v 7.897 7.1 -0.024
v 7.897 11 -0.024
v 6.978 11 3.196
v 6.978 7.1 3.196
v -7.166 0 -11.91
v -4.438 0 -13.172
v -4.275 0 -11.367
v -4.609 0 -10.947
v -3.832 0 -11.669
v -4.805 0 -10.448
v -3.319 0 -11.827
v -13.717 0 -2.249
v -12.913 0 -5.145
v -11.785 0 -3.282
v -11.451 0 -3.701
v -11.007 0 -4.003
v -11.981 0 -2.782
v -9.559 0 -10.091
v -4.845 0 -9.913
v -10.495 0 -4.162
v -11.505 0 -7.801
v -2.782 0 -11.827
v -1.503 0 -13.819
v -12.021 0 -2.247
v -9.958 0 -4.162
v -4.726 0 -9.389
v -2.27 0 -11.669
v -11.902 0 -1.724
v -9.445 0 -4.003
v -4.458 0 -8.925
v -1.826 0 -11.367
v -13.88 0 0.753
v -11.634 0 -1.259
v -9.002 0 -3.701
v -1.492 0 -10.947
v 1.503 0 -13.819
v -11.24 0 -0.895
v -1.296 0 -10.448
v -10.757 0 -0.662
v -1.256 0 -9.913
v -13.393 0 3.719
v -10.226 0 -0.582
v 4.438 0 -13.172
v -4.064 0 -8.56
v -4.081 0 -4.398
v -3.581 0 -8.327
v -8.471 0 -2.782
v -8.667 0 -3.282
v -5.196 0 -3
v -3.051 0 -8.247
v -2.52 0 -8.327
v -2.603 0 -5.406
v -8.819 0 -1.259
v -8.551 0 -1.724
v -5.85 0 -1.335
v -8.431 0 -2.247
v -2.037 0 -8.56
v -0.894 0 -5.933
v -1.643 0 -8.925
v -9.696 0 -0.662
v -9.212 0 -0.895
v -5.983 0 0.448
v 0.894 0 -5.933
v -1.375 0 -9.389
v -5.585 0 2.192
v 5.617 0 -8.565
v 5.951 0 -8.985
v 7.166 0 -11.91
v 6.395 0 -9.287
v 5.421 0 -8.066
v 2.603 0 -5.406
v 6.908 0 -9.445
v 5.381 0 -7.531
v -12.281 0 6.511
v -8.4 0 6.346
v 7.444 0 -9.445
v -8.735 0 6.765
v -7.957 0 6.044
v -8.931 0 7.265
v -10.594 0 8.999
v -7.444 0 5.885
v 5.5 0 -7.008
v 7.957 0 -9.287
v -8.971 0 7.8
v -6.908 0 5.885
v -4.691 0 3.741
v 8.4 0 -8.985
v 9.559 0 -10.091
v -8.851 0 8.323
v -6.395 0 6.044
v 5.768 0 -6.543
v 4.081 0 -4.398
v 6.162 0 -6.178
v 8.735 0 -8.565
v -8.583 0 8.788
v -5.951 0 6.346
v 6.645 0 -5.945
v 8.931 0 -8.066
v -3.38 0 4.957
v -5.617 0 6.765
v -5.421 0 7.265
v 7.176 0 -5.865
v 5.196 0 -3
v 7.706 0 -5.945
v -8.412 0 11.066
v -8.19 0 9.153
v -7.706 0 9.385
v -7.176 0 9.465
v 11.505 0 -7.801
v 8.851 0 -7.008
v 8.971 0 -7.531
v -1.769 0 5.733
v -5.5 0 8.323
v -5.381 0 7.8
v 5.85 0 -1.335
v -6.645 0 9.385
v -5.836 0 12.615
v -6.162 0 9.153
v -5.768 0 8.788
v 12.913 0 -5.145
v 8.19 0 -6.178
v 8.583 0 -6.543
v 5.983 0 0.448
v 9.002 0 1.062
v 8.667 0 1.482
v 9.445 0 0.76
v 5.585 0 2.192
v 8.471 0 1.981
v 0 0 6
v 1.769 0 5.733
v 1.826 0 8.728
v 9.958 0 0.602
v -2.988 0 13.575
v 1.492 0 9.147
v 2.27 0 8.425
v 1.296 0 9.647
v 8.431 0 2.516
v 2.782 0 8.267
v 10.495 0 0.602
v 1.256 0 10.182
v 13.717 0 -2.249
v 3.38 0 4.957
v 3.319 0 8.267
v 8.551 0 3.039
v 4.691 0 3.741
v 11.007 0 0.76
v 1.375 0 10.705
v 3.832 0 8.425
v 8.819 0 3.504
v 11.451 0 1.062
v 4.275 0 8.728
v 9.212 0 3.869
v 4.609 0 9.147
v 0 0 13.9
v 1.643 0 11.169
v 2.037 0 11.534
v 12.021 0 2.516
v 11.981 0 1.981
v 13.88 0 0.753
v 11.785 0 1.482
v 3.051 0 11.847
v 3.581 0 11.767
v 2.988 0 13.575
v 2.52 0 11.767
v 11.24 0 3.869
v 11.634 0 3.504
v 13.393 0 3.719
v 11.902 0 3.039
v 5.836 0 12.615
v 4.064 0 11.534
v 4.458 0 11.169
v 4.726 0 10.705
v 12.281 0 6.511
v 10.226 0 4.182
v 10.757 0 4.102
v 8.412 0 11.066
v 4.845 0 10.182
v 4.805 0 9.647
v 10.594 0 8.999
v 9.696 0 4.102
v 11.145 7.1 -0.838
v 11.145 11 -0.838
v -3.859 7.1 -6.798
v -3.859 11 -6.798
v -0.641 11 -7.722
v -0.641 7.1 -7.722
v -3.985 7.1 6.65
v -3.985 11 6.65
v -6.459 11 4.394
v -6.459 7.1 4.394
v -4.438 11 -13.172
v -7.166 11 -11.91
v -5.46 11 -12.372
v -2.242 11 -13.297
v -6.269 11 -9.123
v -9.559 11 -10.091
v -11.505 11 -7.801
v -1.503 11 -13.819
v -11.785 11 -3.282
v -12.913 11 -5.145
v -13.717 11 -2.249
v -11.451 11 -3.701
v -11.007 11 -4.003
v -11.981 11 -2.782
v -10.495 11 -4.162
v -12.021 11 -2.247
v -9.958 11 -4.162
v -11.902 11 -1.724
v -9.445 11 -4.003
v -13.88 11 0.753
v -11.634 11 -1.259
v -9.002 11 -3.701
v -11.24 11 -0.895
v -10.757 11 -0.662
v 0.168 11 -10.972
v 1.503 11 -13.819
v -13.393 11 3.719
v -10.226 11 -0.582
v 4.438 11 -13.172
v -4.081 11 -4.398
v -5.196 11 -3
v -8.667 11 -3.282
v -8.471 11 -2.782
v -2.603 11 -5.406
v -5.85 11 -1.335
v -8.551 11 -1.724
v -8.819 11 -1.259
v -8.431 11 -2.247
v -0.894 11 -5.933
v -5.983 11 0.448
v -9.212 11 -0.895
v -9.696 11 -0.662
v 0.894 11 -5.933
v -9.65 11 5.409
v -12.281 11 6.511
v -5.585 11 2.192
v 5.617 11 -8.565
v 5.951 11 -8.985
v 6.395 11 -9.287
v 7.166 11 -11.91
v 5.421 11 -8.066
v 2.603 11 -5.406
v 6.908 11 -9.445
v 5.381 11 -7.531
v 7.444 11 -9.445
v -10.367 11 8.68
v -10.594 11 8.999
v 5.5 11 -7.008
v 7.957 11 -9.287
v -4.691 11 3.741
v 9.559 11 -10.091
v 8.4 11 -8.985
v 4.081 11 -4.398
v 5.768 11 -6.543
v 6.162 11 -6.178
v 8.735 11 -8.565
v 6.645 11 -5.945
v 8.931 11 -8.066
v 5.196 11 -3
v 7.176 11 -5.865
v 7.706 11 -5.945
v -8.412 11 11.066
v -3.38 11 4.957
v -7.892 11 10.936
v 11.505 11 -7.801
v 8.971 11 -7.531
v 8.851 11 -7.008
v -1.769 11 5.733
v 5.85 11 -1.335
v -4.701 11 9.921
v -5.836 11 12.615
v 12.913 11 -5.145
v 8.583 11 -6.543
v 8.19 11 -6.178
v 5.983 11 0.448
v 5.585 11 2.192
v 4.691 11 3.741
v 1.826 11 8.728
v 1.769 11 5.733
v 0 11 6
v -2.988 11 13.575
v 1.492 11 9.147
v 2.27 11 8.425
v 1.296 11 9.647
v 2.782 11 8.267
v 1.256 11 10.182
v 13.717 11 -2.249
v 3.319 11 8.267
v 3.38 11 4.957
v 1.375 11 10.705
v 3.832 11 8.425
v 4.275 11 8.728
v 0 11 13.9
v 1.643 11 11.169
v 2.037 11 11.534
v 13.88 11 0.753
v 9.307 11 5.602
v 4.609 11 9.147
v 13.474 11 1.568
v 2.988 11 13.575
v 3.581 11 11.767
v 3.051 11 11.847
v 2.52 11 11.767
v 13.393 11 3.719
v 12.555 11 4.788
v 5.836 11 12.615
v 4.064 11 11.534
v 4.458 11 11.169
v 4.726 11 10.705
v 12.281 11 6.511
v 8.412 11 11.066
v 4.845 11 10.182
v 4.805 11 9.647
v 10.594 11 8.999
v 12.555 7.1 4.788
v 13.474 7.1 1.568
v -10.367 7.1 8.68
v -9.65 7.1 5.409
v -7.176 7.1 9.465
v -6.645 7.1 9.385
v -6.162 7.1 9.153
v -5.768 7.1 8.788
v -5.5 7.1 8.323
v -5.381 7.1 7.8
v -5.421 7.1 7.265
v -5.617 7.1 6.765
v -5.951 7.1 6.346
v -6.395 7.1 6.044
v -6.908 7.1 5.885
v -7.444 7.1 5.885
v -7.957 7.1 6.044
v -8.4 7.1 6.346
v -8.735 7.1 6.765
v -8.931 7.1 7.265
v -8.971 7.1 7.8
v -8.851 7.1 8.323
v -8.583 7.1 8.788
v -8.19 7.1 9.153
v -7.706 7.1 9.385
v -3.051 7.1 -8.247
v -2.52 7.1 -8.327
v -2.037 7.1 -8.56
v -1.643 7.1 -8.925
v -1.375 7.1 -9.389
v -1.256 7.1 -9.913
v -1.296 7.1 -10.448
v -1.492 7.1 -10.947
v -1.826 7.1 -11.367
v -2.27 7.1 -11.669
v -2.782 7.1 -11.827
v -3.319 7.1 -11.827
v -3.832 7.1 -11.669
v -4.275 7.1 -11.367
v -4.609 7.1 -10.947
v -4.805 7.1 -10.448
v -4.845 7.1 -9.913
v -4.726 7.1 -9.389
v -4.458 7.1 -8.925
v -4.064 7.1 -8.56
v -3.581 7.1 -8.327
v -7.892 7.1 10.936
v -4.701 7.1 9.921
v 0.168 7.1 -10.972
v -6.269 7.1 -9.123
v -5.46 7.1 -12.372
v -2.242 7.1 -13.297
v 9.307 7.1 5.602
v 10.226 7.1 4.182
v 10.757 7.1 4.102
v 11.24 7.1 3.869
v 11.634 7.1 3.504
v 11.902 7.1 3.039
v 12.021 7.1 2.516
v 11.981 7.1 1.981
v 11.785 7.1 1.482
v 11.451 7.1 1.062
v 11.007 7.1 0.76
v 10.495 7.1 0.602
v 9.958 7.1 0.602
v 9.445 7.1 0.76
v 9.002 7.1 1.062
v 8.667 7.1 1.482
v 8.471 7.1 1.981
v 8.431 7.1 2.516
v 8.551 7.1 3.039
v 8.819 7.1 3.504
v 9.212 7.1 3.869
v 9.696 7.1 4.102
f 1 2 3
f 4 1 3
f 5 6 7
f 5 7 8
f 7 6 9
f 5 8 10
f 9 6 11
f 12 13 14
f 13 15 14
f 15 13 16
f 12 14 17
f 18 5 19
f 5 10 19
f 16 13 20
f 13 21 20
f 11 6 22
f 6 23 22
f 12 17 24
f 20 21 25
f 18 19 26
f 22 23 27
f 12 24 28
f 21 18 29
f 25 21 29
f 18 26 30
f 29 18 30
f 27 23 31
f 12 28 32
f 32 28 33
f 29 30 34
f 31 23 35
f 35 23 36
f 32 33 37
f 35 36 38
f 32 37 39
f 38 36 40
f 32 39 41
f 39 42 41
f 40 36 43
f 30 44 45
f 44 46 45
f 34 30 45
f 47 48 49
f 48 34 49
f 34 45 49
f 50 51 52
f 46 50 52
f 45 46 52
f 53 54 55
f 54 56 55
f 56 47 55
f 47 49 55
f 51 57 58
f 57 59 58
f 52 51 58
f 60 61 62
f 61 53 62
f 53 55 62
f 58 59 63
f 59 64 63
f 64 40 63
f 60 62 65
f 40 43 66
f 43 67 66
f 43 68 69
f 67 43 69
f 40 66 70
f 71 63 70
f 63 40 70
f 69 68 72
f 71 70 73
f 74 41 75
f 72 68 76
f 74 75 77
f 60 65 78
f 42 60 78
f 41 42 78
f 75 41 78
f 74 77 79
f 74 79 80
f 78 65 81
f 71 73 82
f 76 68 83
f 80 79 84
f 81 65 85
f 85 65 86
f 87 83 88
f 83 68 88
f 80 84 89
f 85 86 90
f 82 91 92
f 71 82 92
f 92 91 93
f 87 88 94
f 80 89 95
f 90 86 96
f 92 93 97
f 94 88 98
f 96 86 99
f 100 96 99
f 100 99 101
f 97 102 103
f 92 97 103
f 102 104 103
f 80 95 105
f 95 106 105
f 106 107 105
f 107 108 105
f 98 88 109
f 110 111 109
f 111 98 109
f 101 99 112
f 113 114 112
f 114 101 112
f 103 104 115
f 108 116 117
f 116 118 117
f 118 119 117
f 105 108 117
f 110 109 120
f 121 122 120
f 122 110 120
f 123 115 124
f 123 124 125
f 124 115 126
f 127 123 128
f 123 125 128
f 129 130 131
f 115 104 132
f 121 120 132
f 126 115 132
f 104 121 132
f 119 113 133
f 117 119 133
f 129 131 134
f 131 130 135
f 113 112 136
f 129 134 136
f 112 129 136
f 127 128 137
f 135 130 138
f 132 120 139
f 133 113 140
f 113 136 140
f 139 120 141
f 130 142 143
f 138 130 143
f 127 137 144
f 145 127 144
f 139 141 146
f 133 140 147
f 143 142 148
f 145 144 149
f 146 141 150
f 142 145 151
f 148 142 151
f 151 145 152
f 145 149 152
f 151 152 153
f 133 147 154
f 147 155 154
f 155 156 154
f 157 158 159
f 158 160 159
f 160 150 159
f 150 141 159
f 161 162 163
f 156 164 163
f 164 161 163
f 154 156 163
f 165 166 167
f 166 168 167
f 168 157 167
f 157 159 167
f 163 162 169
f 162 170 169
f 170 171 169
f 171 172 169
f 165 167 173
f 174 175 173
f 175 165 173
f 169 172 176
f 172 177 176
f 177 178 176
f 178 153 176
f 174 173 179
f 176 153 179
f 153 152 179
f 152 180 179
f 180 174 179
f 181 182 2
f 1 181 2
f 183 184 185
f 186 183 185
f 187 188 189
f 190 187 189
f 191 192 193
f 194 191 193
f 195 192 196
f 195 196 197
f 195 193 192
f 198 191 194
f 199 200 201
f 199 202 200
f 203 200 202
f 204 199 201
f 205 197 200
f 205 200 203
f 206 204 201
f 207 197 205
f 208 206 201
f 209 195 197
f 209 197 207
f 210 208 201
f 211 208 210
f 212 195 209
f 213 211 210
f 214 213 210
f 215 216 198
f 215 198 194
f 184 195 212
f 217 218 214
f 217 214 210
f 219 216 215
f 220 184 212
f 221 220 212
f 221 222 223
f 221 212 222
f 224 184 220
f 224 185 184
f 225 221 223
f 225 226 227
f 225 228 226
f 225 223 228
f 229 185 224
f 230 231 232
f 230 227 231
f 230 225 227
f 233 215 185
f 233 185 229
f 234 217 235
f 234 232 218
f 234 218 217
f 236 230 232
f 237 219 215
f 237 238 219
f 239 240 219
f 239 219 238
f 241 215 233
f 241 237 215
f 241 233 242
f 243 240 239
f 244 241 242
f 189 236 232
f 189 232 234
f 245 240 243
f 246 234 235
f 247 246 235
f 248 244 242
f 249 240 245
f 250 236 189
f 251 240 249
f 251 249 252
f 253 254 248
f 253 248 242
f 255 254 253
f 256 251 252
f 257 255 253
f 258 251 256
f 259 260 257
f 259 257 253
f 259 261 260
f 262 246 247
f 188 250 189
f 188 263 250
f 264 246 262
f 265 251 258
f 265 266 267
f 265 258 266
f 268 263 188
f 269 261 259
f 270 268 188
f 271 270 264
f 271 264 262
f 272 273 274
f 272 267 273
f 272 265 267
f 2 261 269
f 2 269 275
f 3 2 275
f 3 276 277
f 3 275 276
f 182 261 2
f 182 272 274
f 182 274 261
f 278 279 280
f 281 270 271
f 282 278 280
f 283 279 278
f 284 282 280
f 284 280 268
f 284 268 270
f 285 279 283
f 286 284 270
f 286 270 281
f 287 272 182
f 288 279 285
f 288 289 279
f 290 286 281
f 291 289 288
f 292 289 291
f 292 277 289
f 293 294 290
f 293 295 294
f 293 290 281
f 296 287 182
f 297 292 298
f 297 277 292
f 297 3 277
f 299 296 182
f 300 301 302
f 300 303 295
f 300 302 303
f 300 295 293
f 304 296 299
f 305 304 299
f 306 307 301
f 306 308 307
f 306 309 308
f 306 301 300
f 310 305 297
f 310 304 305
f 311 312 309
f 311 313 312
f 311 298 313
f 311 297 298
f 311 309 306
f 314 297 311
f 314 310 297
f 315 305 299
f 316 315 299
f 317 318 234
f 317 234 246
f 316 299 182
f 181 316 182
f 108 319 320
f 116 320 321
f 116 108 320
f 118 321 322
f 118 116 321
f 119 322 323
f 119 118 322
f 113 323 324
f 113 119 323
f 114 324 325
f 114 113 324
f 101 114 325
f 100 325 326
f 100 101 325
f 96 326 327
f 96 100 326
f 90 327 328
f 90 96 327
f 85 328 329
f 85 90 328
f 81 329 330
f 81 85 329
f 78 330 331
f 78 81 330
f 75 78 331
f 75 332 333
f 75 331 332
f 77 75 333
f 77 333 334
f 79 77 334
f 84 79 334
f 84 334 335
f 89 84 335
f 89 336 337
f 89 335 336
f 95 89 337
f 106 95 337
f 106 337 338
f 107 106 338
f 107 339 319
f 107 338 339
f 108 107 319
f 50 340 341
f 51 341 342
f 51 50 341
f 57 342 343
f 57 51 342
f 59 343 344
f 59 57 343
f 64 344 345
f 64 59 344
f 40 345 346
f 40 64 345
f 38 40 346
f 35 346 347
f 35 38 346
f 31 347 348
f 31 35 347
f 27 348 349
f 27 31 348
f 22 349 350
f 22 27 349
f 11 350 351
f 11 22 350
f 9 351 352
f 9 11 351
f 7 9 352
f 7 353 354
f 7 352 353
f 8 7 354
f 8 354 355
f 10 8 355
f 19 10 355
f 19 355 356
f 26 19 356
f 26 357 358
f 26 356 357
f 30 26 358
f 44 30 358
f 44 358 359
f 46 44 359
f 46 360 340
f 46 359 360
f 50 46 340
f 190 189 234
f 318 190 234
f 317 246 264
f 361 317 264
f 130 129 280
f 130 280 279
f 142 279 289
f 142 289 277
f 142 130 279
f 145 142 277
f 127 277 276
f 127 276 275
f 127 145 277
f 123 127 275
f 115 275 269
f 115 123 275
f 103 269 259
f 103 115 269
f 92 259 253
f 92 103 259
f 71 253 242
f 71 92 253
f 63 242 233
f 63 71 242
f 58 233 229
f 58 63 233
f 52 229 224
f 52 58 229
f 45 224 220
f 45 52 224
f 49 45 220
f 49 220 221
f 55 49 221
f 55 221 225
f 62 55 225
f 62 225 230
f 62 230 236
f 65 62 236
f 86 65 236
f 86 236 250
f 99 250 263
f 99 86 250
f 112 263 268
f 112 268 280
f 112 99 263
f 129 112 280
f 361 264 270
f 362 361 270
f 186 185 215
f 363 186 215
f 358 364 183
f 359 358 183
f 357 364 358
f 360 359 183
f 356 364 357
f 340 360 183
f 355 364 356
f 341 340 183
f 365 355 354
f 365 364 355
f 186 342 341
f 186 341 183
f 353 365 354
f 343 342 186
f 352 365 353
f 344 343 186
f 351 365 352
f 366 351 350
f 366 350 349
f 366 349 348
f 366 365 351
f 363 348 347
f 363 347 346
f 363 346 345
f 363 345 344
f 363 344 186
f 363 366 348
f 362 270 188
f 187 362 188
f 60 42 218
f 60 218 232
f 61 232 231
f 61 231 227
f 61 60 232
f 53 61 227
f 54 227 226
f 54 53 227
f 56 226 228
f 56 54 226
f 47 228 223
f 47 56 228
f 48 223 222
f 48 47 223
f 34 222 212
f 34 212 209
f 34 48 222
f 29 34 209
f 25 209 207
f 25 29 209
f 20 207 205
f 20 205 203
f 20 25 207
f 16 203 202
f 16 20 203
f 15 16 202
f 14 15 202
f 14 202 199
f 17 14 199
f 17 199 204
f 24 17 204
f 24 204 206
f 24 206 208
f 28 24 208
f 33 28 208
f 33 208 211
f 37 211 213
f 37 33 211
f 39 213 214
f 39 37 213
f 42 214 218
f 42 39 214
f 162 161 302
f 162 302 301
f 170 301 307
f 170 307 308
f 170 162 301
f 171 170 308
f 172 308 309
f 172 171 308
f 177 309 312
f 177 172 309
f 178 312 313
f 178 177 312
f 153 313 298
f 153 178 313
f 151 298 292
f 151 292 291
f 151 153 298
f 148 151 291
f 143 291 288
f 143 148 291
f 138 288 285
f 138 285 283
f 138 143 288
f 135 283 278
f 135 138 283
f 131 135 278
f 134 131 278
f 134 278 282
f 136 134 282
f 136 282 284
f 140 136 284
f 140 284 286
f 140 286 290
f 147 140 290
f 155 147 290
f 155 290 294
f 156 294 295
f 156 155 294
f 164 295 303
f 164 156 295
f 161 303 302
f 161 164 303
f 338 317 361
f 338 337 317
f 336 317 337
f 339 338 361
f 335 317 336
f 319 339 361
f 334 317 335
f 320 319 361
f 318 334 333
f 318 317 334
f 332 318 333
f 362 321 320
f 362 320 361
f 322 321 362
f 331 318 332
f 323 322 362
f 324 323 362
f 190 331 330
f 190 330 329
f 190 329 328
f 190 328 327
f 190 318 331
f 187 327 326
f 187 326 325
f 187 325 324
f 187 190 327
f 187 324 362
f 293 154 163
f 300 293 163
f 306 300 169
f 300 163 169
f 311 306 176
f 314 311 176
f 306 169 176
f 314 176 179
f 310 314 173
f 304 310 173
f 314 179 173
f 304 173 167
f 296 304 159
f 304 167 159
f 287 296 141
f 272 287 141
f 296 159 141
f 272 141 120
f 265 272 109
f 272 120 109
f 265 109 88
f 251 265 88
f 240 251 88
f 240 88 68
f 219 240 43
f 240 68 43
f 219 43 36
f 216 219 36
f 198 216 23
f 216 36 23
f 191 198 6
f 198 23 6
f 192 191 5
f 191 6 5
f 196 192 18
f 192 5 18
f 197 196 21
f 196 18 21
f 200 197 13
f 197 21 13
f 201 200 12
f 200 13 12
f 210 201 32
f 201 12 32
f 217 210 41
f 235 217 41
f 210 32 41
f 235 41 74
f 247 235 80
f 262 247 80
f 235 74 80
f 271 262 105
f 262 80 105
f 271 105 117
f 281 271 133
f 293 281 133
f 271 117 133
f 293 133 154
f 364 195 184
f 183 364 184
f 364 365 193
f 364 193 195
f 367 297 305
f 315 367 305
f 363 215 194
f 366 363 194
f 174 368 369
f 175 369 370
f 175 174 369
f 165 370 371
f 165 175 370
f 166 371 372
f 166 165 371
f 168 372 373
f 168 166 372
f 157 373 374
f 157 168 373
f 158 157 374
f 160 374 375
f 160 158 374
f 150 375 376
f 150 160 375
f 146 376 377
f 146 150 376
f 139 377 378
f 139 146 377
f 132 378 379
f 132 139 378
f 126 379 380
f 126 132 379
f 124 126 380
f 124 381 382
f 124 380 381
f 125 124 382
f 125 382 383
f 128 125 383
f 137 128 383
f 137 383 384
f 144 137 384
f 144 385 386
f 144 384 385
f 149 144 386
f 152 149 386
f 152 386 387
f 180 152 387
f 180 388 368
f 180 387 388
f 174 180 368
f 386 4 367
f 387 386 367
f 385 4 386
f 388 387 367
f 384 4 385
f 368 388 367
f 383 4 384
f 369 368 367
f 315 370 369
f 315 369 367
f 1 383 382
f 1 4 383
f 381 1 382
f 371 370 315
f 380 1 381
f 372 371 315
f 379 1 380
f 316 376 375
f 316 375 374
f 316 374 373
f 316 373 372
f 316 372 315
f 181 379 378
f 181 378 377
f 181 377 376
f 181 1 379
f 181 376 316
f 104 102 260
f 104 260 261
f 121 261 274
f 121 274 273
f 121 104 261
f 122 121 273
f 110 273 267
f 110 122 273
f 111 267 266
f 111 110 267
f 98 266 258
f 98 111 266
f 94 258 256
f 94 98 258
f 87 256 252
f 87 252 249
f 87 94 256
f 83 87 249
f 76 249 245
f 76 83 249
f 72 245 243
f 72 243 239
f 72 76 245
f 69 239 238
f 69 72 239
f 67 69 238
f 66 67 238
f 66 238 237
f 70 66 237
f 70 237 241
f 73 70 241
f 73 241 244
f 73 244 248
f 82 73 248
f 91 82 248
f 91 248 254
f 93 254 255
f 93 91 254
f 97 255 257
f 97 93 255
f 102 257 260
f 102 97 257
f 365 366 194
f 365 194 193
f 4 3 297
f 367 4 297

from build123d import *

# Parameters (mm, degrees)
ESQUISSE3_R             = 13.9
ESQUISSE3_R_2           = 6
ESQUISSE3_R_3           = 1.8
BOSS_EXTRU_1_DEPTH      = 11
ENL_V_MAT_EXTRU_1_DEPTH = 3.9


with BuildPart() as part:
    # Esquisse3 → Boss.-Extru.1 (new body)
    with BuildSketch(Plane(origin=(0, 0, 0), x_dir=(1, 0, 0), z_dir=(0, 1, 0))):
        with Locations(Location((0, 0, 0), (0, 0, 270))):
            Circle(ESQUISSE3_R)
        with Locations(Location((0, 0, 0), (0, 0, 270))):
            Circle(ESQUISSE3_R_2, mode=Mode.SUBTRACT)
        with Locations(Location((-3.050511372, 10.04710806, 0), (0, 0, 270))):
            Circle(ESQUISSE3_R_3, mode=Mode.SUBTRACT)
        with Locations(Location((7.175795129, 7.665374373, 0), (0, 0, 270))):
            Circle(ESQUISSE3_R_3, mode=Mode.SUBTRACT)
        with Locations(Location((10.2263065, -2.381733688, 0), (0, 0, 270))):
            Circle(ESQUISSE3_R_3, mode=Mode.SUBTRACT)
        with Locations(Location((3.050511372, -10.04710806, 0), (0, 0, 270))):
            Circle(ESQUISSE3_R_3, mode=Mode.SUBTRACT)
        with Locations(Location((-7.175795129, -7.665374373, 0), (0, 0, 270))):
            Circle(ESQUISSE3_R_3, mode=Mode.SUBTRACT)
        with Locations(Location((-10.2263065, 2.381733688, 0), (0, 0, 270))):
            Circle(ESQUISSE3_R_3, mode=Mode.SUBTRACT)
    extrude(amount=BOSS_EXTRU_1_DEPTH)

    # Esquisse4 → Enlèv. mat.-Extru.1 (cut)
    with BuildSketch(Plane(origin=(0, 11, 0), x_dir=(1, 0, 0), z_dir=(0, 1, 0))):
        Polygon((-3.859043077, 6.797552734), (-0.640579761, 7.722121401), (0.167951944, 10.971676727), (-2.241979667, 13.296663386), (-5.460442982, 12.372094719), (-6.268974687, 9.122539393), align=None)
        Polygon((12.555495262, -4.787604225), (13.474445885, -1.567532319), (11.145257124, 0.838338219), (7.897117739, 0.02413685), (6.978167116, -3.195935057), (9.307355877, -5.601805594), align=None)
        Polygon((-4.701263167, -9.921482726), (-3.984682, -6.650421008), (-6.459213962, -4.394312654), (-9.650327091, -5.409266019), (-10.366908258, -8.680327737), (-7.892376296, -10.936436091), align=None)
    extrude(amount=-ENL_V_MAT_EXTRU_1_DEPTH, mode=Mode.SUBTRACT)


solid = part.part
